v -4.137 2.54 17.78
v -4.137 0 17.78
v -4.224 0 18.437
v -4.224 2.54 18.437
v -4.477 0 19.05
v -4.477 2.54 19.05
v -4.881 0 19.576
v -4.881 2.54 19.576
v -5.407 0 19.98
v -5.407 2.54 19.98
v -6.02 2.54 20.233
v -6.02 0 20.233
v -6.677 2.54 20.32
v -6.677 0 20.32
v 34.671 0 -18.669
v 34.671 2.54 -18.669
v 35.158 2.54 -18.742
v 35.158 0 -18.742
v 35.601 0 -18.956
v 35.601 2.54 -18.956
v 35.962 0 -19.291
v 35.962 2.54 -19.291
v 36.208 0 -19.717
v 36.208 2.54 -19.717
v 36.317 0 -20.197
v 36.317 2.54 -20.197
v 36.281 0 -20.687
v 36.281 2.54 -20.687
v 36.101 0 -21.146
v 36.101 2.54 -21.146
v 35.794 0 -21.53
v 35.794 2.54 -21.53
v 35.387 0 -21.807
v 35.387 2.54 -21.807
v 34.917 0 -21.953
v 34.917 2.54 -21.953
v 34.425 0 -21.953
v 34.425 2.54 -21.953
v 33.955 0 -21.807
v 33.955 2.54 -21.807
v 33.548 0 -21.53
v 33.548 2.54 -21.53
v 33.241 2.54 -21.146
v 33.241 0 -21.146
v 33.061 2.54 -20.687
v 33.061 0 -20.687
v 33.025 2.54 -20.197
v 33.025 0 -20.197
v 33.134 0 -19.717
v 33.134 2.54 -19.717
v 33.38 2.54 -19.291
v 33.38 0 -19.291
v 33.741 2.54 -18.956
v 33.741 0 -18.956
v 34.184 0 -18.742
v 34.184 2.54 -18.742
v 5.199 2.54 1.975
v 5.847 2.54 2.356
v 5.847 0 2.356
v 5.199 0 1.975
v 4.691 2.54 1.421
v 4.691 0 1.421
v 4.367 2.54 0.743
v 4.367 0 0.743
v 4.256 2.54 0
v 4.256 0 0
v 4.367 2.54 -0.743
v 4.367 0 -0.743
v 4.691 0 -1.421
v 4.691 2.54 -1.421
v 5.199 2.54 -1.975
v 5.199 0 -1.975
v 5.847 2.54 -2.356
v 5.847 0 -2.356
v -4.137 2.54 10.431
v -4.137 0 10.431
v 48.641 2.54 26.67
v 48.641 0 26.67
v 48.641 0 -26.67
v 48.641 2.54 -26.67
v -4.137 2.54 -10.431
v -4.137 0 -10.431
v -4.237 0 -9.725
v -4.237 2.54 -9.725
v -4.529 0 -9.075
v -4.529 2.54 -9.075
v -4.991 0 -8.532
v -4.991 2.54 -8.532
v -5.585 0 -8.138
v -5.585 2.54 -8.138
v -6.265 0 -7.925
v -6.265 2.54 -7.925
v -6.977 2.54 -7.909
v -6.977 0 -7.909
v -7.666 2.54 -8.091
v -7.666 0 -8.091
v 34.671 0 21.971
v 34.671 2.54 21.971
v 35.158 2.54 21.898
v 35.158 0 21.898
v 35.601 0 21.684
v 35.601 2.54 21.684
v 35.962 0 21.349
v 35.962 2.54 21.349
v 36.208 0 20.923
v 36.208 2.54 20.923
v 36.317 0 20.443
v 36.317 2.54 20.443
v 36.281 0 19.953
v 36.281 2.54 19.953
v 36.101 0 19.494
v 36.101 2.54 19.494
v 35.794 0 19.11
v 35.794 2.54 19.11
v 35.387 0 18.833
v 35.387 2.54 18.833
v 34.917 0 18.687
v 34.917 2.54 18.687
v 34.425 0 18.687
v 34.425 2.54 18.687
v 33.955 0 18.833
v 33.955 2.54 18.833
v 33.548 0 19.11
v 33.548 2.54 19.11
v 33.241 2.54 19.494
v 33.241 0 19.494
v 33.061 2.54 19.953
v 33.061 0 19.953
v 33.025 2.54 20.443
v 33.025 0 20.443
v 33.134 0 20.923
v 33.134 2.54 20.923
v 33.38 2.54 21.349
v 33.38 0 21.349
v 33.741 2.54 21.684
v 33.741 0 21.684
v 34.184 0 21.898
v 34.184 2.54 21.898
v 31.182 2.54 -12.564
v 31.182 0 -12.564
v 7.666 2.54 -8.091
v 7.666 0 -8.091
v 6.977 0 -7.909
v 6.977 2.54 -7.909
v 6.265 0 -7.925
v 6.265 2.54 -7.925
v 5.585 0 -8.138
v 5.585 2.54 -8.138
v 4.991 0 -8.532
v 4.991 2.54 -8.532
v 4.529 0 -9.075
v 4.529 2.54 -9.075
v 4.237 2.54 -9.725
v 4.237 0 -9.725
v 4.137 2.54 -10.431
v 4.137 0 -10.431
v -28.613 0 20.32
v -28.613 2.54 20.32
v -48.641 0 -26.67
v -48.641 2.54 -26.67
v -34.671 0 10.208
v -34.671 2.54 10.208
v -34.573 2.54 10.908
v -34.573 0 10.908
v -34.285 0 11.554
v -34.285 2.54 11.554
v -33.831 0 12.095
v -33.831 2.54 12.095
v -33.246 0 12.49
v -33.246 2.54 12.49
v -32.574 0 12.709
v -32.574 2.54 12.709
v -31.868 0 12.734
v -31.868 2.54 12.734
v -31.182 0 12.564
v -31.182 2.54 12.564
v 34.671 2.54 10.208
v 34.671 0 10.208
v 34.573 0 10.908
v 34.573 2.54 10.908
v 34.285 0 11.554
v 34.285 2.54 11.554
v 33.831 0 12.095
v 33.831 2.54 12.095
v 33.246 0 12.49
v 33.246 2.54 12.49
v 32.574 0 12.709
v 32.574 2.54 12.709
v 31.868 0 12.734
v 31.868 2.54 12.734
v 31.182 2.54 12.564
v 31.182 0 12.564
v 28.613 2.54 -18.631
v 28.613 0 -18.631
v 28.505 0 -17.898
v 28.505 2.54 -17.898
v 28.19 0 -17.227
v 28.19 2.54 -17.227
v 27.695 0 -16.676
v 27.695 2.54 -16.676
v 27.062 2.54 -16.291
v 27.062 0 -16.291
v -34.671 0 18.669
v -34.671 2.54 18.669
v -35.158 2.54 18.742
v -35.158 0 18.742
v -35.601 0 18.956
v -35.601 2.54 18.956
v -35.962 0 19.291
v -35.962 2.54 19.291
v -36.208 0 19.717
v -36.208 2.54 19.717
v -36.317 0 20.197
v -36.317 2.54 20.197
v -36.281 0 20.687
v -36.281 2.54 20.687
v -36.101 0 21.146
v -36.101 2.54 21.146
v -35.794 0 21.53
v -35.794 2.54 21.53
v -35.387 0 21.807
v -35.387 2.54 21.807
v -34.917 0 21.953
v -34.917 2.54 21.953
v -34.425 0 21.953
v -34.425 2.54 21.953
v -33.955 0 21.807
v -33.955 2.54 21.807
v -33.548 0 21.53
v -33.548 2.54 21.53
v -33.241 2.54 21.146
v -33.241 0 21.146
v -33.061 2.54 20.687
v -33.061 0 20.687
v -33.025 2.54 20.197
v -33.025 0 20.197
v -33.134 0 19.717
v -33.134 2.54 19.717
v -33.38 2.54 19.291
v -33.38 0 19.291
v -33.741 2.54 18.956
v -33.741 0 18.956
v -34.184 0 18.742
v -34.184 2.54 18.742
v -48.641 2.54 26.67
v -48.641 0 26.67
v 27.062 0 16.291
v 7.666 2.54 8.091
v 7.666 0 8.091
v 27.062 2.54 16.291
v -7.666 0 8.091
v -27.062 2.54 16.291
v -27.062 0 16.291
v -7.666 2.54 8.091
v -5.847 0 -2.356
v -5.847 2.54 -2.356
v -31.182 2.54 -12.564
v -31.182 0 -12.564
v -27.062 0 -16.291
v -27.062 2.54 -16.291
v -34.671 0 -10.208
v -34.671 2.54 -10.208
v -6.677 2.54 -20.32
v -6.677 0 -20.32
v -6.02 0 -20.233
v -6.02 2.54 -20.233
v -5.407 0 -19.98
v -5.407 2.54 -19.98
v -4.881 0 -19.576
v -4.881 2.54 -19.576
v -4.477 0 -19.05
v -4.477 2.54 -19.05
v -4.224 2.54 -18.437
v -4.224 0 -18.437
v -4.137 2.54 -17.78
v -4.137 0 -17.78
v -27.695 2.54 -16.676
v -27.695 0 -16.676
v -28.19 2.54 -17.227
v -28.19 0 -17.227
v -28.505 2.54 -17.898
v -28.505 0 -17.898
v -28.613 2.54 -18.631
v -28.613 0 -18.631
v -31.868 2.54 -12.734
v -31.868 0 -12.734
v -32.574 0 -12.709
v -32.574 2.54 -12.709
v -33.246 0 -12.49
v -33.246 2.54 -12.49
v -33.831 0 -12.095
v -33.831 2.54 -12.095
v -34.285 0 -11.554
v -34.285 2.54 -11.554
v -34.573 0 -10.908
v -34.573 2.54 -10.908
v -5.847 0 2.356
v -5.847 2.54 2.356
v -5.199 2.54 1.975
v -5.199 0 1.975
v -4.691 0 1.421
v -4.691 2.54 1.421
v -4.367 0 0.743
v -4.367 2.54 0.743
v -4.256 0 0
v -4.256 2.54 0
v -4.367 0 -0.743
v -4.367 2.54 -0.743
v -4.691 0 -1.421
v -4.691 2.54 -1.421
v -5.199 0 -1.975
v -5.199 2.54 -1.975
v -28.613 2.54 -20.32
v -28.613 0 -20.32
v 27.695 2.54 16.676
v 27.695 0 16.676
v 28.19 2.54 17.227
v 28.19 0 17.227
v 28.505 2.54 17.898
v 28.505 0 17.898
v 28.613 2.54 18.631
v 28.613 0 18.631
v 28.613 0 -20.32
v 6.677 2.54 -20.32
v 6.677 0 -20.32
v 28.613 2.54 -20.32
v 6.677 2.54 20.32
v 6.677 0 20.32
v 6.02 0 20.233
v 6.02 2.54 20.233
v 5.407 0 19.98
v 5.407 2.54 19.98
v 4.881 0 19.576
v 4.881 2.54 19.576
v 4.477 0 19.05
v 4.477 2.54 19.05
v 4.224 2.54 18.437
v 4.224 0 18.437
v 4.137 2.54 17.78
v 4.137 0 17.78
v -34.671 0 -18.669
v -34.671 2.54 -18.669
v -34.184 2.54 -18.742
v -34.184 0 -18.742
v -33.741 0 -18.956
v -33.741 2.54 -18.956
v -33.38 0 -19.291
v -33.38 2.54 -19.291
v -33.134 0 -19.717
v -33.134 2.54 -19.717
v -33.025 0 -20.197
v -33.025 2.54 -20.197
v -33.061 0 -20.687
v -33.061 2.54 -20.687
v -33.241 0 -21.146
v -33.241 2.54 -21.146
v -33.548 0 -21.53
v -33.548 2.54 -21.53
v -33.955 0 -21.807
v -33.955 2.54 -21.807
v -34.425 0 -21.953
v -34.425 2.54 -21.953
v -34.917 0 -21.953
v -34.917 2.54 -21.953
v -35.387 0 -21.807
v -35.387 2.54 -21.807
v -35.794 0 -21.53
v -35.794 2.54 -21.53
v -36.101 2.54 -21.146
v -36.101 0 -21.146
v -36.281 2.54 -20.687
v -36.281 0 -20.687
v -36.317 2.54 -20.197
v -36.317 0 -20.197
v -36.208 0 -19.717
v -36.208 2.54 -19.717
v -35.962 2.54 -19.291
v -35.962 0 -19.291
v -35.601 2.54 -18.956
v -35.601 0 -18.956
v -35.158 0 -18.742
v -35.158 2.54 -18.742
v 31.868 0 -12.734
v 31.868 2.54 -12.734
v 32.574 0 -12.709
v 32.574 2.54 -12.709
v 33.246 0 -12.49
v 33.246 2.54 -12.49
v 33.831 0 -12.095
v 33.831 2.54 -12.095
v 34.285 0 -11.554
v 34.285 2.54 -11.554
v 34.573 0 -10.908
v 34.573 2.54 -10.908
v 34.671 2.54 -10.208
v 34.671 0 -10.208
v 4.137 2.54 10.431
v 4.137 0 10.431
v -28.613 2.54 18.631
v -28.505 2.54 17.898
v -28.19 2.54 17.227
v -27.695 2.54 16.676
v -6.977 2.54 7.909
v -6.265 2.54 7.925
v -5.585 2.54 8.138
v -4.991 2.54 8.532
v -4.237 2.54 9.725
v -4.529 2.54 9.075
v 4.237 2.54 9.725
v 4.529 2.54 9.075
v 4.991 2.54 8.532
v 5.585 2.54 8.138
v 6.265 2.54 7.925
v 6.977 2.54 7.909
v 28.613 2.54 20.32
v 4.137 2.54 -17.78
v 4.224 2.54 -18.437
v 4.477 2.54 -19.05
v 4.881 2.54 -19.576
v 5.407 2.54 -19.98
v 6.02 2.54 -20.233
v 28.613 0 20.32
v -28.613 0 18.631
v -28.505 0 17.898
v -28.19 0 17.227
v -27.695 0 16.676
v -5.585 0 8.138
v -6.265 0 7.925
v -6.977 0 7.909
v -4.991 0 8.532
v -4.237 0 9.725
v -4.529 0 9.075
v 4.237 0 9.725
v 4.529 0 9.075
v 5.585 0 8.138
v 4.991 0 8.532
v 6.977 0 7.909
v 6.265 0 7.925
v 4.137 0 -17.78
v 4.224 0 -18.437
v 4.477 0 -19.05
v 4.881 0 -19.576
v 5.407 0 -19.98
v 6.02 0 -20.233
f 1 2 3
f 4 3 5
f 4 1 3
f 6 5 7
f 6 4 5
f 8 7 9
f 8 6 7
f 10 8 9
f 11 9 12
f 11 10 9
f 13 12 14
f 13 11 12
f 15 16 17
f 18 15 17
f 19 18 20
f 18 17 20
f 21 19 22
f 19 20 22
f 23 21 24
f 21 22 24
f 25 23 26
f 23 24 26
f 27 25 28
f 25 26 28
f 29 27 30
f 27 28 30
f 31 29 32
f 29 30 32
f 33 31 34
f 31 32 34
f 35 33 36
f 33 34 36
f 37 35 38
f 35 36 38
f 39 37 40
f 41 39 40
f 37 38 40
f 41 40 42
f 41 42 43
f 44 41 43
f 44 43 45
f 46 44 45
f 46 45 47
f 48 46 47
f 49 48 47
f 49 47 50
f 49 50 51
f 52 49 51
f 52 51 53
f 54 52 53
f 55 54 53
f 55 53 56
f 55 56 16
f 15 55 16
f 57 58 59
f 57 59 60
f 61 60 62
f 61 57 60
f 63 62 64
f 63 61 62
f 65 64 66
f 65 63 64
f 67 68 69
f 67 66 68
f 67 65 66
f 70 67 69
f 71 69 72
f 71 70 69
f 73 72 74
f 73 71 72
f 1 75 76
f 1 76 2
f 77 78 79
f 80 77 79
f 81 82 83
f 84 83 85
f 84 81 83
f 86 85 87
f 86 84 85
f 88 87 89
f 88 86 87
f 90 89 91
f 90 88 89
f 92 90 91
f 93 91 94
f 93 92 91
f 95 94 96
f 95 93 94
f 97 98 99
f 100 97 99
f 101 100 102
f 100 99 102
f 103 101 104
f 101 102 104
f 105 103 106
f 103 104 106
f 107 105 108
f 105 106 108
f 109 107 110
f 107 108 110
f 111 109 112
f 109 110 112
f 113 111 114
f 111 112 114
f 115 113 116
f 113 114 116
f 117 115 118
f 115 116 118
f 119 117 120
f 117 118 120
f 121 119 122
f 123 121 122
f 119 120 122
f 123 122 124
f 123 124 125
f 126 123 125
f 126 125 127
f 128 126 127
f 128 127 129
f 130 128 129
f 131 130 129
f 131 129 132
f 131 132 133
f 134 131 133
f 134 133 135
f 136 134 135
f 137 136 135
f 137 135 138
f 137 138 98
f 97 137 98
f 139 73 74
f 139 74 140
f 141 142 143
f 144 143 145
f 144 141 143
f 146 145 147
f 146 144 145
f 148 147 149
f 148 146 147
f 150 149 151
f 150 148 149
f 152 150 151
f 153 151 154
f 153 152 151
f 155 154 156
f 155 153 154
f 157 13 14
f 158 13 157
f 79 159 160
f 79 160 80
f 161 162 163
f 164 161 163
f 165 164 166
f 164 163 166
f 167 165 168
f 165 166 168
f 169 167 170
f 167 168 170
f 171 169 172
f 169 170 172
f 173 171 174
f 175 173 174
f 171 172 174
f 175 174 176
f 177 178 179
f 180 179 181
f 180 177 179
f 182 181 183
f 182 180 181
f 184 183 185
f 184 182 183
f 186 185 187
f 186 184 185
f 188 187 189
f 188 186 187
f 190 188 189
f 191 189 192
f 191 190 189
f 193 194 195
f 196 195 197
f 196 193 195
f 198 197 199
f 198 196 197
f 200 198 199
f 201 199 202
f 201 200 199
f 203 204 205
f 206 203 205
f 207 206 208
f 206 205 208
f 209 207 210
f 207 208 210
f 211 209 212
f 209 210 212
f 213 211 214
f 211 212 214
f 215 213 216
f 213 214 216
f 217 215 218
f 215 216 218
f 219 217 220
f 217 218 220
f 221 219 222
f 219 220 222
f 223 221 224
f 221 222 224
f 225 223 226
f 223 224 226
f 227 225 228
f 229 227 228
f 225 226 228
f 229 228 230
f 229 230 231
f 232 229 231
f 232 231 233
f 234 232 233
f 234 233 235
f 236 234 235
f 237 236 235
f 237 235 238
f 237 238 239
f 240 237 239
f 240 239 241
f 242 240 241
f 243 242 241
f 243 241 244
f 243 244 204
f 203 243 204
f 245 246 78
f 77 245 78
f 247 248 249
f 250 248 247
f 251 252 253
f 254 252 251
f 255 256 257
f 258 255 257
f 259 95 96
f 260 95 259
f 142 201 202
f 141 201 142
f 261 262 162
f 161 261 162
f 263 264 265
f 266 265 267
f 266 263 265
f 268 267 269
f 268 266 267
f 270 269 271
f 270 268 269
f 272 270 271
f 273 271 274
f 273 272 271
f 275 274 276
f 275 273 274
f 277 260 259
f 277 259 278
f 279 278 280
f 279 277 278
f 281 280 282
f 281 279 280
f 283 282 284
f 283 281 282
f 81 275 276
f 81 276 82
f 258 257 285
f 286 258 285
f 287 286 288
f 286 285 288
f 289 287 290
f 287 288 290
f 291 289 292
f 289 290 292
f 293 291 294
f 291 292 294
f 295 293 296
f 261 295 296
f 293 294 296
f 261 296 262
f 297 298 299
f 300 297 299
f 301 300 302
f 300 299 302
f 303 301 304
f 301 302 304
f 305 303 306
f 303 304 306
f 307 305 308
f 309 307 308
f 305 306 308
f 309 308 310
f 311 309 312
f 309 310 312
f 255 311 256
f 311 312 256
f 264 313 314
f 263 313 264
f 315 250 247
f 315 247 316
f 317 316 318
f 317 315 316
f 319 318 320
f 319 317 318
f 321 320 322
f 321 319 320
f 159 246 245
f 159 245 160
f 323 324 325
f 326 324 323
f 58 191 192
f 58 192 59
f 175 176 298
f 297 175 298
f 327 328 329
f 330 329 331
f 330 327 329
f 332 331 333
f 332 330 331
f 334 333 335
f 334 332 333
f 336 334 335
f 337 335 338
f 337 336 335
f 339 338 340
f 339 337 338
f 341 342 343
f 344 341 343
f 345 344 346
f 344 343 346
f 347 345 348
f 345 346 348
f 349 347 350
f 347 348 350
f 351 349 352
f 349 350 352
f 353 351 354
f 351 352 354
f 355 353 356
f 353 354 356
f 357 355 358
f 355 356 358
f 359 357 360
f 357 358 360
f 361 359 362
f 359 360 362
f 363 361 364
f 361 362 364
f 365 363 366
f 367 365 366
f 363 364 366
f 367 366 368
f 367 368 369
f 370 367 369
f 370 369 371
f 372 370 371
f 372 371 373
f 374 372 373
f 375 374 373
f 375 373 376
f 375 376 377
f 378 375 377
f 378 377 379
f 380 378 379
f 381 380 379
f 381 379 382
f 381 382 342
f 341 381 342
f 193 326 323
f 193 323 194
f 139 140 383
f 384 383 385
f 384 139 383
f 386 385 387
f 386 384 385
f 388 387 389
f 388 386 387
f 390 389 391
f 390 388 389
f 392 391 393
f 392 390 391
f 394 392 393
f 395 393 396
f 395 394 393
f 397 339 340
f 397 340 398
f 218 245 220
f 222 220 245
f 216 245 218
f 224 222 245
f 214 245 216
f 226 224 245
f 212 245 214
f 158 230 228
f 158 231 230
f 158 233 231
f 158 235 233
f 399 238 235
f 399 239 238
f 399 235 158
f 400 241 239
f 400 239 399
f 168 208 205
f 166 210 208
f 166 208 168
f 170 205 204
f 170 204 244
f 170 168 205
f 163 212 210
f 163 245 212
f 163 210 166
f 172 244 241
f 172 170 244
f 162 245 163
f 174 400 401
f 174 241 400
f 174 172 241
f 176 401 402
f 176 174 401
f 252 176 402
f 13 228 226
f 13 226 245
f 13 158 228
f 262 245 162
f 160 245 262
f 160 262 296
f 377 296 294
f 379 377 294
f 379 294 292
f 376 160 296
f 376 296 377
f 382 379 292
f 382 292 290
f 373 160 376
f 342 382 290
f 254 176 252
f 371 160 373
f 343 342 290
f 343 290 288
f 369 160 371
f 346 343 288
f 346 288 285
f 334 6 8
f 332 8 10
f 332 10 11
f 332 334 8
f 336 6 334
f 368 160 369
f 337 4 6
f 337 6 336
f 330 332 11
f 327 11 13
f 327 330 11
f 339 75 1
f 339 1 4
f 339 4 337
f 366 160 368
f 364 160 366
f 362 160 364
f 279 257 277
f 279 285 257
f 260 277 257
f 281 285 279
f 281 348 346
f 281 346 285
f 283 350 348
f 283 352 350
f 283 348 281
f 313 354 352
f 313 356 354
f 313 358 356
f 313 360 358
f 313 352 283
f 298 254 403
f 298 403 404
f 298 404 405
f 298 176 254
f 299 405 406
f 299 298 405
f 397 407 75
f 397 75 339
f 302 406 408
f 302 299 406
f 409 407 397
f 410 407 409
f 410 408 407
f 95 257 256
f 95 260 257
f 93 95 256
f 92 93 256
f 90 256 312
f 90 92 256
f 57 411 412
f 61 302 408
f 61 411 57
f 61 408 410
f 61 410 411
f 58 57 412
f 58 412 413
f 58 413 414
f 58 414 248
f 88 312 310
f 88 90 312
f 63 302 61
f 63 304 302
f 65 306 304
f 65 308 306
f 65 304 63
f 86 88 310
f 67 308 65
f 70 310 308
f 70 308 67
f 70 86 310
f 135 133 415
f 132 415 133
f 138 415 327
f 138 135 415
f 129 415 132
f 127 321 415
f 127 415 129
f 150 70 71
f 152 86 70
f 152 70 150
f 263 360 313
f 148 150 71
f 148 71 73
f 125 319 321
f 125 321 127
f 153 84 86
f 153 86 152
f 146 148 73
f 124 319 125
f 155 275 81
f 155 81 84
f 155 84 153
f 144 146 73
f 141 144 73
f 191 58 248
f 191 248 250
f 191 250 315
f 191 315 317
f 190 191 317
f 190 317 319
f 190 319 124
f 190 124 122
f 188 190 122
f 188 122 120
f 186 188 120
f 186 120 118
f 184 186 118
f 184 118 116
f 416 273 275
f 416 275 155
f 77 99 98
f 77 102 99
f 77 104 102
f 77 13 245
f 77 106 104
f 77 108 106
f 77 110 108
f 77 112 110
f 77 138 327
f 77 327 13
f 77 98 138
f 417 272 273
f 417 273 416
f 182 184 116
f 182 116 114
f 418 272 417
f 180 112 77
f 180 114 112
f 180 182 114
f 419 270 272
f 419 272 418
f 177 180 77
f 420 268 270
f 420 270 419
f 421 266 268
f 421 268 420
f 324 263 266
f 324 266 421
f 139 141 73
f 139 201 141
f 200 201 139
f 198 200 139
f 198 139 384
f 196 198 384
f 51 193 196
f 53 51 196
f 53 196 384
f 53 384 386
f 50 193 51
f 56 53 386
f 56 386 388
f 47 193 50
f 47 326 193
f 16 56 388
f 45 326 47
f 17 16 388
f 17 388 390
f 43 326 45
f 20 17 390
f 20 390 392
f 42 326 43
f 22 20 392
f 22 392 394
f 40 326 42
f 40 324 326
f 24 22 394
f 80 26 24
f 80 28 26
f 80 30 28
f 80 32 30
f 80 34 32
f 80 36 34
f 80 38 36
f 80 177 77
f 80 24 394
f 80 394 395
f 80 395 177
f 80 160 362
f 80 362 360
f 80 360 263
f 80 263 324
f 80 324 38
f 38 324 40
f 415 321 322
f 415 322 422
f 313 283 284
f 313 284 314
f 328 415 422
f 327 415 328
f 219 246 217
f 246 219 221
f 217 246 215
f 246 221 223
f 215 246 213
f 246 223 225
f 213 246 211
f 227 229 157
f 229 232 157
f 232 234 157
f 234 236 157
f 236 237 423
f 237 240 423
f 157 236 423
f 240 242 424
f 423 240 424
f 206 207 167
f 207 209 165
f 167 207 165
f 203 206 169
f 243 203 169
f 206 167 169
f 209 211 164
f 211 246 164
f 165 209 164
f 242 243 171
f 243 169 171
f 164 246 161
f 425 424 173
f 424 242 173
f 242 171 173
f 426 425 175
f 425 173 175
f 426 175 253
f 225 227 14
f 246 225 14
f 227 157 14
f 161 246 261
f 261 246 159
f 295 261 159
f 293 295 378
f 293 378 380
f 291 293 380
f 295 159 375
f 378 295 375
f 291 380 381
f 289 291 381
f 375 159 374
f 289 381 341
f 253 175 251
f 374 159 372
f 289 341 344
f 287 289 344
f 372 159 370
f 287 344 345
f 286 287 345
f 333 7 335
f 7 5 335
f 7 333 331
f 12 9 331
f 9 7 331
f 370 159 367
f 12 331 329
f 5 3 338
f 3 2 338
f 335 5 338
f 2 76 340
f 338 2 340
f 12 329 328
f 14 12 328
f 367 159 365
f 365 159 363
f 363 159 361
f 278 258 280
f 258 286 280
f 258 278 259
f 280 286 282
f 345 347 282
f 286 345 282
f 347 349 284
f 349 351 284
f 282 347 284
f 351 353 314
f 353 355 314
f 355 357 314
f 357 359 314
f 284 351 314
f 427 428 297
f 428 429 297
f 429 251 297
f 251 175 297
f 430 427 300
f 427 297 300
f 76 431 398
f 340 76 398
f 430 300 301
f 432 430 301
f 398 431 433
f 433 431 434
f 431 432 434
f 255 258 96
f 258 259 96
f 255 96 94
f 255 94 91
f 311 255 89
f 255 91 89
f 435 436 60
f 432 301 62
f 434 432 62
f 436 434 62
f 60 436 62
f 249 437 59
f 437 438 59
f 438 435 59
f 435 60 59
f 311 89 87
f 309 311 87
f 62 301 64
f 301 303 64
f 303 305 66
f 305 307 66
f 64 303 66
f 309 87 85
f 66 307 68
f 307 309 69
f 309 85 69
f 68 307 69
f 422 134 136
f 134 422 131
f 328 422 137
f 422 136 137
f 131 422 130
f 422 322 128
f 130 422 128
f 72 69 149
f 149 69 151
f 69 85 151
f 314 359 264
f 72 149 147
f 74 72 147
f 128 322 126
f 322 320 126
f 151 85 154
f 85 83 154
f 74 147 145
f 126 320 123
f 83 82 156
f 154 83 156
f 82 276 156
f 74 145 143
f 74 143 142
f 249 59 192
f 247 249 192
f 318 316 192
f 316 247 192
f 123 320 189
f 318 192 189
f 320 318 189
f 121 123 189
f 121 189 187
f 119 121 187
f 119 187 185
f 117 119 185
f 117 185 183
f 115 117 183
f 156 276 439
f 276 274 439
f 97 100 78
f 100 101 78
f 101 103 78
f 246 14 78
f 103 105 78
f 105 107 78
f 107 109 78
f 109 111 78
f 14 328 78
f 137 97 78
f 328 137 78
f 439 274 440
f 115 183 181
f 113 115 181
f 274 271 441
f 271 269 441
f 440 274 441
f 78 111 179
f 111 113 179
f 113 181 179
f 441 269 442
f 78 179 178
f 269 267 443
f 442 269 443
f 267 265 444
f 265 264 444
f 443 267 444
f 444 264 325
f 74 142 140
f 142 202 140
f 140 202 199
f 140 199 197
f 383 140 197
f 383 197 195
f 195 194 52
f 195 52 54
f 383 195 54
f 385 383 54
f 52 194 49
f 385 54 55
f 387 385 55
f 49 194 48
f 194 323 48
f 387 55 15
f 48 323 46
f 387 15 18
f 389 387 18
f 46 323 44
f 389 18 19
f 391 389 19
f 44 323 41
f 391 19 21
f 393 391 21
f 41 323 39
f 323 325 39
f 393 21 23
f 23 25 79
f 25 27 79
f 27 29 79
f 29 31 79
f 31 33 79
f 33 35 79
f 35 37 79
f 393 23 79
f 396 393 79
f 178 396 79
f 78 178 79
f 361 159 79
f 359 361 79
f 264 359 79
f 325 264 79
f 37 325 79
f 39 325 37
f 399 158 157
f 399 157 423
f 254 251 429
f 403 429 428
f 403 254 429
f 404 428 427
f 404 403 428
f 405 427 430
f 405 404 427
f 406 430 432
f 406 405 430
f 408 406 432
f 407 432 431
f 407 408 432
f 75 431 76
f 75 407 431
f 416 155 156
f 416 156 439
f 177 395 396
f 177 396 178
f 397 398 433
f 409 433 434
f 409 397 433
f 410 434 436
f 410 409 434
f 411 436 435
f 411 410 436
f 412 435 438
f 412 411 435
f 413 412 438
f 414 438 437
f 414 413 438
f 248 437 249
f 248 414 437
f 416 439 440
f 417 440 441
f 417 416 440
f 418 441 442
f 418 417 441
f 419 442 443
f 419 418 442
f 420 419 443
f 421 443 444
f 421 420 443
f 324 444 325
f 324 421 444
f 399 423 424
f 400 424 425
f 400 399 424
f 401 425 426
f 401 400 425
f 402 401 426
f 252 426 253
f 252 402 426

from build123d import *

# Parameters (mm, degrees)
SKETCH1_W           = 97.282
SKETCH1_H           = 53.34
BOSS_EXTRUDE1_DEPTH = 2.54
SKETCH2_R           = 1.651
CUT_EXTRUDE1_DEPTH  = 56.530958762


with BuildPart() as part:
    # Sketch1 → Boss-Extrude1 (new body)
    with BuildSketch(Plane(origin=(0, 0, 0), x_dir=(1, 0, 0), z_dir=(0, 1, 0))):
        Rectangle(SKETCH1_W, SKETCH1_H)
    extrude(amount=BOSS_EXTRUDE1_DEPTH)

    # Sketch2 → Cut-Extrude1 (cut, through all)
    with BuildSketch(Plane(origin=(0, 2.54, 0), x_dir=(1, 0, 0), z_dir=(0, 1, 0))):
        with Locations(Location((-34.671, 20.32, 0), (0, 0, 270))):
            Circle(SKETCH2_R)
        with BuildLine():
            ThreePointArc((-4.137168556, 10.430937018), (-5.273705168, 8.313889423), (-7.666216208, 8.091410411))
            Line((-7.666216208, 8.091410411), (-27.062123692, 16.291136246))
            ThreePointArc((-27.062123692, 16.291136246), (-28.190123635, 17.227199464), (-28.61307604, 18.630662853))
            Line((-28.61307604, 18.630662853), (-28.61307604, 20.32))
            Line((-28.61307604, 20.32), (-6.677168556, 20.32))
            ThreePointArc((-6.677168556, 20.32), (-4.881117332, 19.576051224), (-4.137168556, 17.78))
            Line((-4.137168556, 17.78), (-4.137168556, 10.430937018))
        make_face()
        with BuildLine():
            Line((-34.671, 10.20811999), (-34.671, -10.20811999))
            ThreePointArc((-34.671, -10.20811999), (-33.552342054, -12.313205919), (-31.181719082, -12.564062634))
            Line((-31.181719082, -12.564062634), (-5.847021287, -2.355942643))
            ThreePointArc((-5.847021287, -2.355942643), (-4.256302206, 0), (-5.847021287, 2.355942643))
            Line((-5.847021287, 2.355942643), (-31.181719082, 12.564062634))
            ThreePointArc((-31.181719082, 12.564062634), (-33.552342054, 12.313205919), (-34.671, 10.20811999))
        make_face()
        with BuildLine():
            ThreePointArc((-28.61307604, -18.630662853), (-28.190123635, -17.227199464), (-27.062123692, -16.291136246))
            Line((-27.062123692, -16.291136246), (-7.666216208, -8.091410411))
            ThreePointArc((-7.666216208, -8.091410411), (-5.273705168, -8.313889423), (-4.137168556, -10.430937018))
            Line((-4.137168556, -10.430937018), (-4.137168556, -17.78))
            ThreePointArc((-4.137168556, -17.78), (-4.881117332, -19.576051224), (-6.677168556, -20.32))
            Line((-6.677168556, -20.32), (-28.61307604, -20.32))
            Line((-28.61307604, -20.32), (-28.61307604, -18.630662853))
        make_face()
        with BuildLine():
            ThreePointArc((4.137168556, -10.430937018), (5.273705168, -8.313889423), (7.666216208, -8.091410411))
            Line((7.666216208, -8.091410411), (27.062123692, -16.291136246))
            ThreePointArc((27.062123692, -16.291136246), (28.190123635, -17.227199464), (28.61307604, -18.630662853))
            Line((28.61307604, -18.630662853), (28.61307604, -20.32))
            Line((28.61307604, -20.32), (6.677168556, -20.32))
            ThreePointArc((6.677168556, -20.32), (4.881117332, -19.576051224), (4.137168556, -17.78))
            Line((4.137168556, -17.78), (4.137168556, -10.430937018))
        make_face()
        with BuildLine():
            Line((34.671, 10.20811999), (34.671, -10.20811999))
            ThreePointArc((34.671, -10.20811999), (33.552342054, -12.313205919), (31.181719082, -12.564062634))
            Line((31.181719082, -12.564062634), (5.847021287, -2.355942643))
            ThreePointArc((5.847021287, -2.355942643), (4.256302206, 0), (5.847021287, 2.355942643))
            Line((5.847021287, 2.355942643), (31.181719082, 12.564062634))
            ThreePointArc((31.181719082, 12.564062634), (33.552342054, 12.313205919), (34.671, 10.20811999))
        make_face()
        with BuildLine():
            ThreePointArc((4.137168556, 17.78), (4.881117332, 19.576051224), (6.677168556, 20.32))
            Line((6.677168556, 20.32), (28.61307604, 20.32))
            Line((28.61307604, 20.32), (28.61307604, 18.630662853))
            ThreePointArc((28.61307604, 18.630662853), (28.190123635, 17.227199464), (27.062123692, 16.291136246))
            Line((27.062123692, 16.291136246), (7.666216208, 8.091410411))
            ThreePointArc((7.666216208, 8.091410411), (5.273705168, 8.313889423), (4.137168556, 10.430937018))
            Line((4.137168556, 10.430937018), (4.137168556, 17.78))
        make_face()
        with Locations(Location((34.671, 20.32, 0), (0, 0, 270))):
            Circle(SKETCH2_R)
        with Locations(Location((34.671, -20.32, 0), (0, 0, 270))):
            Circle(SKETCH2_R)
        with Locations(Location((-34.671, -20.32, 0), (0, 0, 90))):
            Circle(SKETCH2_R)
    extrude(amount=-CUT_EXTRUDE1_DEPTH, mode=Mode.SUBTRACT)


solid = part.part
